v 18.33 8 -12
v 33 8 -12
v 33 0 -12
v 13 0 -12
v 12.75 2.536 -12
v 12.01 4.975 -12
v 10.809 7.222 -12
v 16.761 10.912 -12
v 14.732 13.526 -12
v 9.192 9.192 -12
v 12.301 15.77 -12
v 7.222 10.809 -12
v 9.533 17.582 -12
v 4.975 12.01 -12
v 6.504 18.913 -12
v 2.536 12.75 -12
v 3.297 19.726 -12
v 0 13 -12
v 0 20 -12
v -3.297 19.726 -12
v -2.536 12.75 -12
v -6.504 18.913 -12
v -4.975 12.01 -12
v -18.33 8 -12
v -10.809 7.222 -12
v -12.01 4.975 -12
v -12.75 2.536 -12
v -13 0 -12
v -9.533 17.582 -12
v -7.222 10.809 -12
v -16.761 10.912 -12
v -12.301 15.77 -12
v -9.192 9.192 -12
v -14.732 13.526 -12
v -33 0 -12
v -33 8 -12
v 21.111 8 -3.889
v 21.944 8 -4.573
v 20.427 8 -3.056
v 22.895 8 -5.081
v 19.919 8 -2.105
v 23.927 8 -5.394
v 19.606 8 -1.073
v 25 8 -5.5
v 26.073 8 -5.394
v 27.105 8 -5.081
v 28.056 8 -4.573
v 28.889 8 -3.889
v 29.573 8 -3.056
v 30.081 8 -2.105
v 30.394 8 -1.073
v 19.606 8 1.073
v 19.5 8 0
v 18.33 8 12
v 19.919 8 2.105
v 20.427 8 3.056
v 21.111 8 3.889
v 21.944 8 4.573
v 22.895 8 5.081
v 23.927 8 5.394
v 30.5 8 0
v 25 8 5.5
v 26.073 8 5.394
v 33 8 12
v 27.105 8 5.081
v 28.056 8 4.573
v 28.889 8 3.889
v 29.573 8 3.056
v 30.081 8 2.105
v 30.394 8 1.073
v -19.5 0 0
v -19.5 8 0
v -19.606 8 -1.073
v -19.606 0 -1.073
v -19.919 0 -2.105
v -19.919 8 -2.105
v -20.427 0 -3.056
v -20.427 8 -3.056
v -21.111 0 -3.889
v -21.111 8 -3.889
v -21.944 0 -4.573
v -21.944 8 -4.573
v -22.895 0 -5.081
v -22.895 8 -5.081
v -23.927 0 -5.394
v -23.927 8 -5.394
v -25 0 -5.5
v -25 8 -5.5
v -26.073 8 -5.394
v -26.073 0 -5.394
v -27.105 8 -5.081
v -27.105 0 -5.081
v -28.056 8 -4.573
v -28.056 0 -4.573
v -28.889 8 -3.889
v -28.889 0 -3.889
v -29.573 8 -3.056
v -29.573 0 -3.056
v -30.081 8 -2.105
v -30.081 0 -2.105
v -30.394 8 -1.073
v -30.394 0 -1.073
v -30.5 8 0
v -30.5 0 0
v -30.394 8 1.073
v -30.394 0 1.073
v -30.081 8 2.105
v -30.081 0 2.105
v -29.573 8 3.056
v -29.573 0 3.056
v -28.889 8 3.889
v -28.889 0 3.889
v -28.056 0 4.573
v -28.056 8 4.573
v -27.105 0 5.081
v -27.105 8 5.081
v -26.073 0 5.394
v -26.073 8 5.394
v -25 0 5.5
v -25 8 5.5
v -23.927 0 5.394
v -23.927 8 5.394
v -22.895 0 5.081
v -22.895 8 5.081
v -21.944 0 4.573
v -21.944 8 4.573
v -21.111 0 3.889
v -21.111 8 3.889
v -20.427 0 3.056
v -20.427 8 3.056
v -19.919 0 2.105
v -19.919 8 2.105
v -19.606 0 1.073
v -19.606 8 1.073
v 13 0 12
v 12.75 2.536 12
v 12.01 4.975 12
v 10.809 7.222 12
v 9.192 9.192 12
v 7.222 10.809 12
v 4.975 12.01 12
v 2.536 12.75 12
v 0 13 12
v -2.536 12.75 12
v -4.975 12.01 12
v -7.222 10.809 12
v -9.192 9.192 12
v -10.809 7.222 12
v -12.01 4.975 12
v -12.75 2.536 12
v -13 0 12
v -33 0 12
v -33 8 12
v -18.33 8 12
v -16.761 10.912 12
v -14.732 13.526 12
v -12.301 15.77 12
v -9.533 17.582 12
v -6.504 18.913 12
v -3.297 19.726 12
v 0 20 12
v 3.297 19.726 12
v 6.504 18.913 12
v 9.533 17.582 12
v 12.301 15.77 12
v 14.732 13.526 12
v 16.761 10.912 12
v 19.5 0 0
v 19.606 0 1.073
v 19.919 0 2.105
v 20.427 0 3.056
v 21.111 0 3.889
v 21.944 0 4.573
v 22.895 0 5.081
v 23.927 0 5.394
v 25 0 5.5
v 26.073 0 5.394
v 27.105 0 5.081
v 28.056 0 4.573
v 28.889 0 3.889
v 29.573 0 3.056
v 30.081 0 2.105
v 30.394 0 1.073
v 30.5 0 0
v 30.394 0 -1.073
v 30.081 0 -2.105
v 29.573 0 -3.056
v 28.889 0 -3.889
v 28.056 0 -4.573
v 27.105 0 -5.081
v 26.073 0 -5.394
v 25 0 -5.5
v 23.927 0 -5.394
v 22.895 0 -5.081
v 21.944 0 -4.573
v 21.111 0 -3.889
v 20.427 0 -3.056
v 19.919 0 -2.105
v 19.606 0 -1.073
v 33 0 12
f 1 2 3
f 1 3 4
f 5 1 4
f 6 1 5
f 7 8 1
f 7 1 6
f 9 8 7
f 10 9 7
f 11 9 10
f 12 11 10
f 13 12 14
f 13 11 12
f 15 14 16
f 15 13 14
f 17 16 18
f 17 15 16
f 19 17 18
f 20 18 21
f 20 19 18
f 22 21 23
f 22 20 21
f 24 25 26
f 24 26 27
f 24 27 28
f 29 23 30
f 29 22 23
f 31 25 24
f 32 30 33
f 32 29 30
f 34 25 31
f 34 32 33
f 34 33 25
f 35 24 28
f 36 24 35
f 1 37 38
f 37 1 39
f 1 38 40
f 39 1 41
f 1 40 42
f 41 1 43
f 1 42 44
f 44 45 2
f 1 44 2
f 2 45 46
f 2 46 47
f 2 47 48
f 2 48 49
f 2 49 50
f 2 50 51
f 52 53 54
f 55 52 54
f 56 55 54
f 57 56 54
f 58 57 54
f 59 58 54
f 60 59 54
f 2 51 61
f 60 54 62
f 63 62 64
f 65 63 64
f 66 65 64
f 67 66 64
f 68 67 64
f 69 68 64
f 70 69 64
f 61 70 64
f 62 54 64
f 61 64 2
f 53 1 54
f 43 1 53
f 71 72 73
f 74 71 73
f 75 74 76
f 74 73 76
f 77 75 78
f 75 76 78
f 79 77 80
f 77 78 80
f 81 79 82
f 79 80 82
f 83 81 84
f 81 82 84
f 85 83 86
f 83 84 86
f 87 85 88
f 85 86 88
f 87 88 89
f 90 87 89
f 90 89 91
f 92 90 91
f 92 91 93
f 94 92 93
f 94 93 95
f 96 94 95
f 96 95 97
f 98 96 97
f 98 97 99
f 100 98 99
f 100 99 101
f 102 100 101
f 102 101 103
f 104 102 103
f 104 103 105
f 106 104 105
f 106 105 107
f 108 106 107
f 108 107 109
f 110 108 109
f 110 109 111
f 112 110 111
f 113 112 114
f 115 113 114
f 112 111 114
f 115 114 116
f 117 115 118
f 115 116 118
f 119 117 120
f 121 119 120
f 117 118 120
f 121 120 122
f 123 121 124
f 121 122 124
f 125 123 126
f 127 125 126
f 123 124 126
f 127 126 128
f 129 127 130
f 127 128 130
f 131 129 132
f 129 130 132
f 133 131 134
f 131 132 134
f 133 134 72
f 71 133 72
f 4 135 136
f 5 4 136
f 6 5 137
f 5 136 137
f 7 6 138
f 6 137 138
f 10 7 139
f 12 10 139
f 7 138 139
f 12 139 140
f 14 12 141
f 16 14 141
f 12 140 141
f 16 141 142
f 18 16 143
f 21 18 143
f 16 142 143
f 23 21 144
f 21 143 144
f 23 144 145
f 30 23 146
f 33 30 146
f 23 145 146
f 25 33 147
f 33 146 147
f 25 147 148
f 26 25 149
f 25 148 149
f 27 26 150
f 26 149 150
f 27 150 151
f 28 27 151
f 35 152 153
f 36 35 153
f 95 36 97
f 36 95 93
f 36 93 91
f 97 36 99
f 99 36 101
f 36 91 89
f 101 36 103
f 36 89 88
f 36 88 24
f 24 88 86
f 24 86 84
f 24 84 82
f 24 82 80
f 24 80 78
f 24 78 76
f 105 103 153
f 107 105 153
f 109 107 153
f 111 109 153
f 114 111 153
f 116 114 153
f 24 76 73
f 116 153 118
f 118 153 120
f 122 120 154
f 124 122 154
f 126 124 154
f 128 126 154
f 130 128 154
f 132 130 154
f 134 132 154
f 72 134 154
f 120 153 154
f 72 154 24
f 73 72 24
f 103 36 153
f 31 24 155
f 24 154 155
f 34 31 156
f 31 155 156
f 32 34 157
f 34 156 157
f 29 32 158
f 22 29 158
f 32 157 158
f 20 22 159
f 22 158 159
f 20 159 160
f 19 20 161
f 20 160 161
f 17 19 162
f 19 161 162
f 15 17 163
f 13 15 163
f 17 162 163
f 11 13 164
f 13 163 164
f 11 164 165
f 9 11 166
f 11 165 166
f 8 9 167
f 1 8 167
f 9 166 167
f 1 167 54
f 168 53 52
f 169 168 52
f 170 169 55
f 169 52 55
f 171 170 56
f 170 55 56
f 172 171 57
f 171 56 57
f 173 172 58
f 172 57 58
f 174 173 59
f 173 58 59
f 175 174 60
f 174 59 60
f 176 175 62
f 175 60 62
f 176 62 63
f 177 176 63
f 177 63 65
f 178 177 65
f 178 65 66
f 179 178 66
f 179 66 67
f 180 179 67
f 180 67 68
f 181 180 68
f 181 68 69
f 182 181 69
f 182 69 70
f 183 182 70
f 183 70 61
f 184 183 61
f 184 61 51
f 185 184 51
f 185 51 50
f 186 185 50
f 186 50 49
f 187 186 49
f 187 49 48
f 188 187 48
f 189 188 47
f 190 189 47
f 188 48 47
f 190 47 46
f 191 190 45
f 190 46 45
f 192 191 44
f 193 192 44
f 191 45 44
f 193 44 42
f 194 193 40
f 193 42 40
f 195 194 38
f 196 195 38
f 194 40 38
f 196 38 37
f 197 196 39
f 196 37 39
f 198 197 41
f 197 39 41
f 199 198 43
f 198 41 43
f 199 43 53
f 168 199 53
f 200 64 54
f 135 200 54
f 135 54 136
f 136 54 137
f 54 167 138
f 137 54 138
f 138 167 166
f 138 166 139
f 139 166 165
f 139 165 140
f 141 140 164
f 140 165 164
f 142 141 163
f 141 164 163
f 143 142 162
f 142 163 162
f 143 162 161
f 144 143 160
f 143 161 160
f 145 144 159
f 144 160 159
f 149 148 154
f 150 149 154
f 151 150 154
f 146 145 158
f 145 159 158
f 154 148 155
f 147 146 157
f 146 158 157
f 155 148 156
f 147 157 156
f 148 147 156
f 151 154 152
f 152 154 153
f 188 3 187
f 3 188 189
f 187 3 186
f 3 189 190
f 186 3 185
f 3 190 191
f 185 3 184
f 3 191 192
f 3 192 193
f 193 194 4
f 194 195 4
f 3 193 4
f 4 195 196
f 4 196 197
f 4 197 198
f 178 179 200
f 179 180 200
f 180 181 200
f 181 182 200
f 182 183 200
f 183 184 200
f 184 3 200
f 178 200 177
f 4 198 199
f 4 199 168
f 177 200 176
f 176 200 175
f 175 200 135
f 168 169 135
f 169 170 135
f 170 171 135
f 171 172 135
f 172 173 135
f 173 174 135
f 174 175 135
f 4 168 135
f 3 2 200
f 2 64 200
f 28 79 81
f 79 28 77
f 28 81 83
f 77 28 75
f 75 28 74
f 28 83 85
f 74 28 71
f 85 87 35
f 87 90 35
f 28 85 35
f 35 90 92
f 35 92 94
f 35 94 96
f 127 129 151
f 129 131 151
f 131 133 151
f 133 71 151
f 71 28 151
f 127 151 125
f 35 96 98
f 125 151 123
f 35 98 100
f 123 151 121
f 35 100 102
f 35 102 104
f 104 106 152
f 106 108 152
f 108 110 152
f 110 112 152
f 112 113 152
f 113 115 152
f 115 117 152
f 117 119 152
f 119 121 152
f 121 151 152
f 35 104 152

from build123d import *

# Parameters (mm, degrees)
EXTRUDE_1_DEPTH     = 12
SKETCH_2_R          = 5.5
CUT_EXTRUDE_1_DEPTH = 38.107950631


with BuildPart() as part:
    # 草图1 → 凸台-拉伸1 (new, symmetric)
    with BuildSketch(Plane.XY):
        with BuildLine():
            Line((-33, 0), (-33, 8))
            Line((-33, 8), (-18.33030278, 8))
            ThreePointArc((-18.33030278, 8), (0, 20), (18.33030278, 8))
            Line((18.33030278, 8), (33, 8))
            Line((33, 8), (33, 0))
            Line((33, 0), (13, 0))
            ThreePointArc((13, 0), (0, 13), (-13, 0))
            Line((-13, 0), (-33, 0))
        make_face()
    extrude(amount=EXTRUDE_1_DEPTH, both=True)

    # 草图2 → 切除-拉伸1 (cut, through all)
    with BuildSketch(Plane(origin=(0, 8, 0), x_dir=(1, 0, 0), z_dir=(0, 1, 0))):
        with Locations(Location((25, 0, 0), (0, 0, 180))):
            Circle(SKETCH_2_R)
        with Locations((-25, 0)):
            Circle(SKETCH_2_R)
    extrude(amount=-CUT_EXTRUDE_1_DEPTH, mode=Mode.SUBTRACT)


solid = part.part
